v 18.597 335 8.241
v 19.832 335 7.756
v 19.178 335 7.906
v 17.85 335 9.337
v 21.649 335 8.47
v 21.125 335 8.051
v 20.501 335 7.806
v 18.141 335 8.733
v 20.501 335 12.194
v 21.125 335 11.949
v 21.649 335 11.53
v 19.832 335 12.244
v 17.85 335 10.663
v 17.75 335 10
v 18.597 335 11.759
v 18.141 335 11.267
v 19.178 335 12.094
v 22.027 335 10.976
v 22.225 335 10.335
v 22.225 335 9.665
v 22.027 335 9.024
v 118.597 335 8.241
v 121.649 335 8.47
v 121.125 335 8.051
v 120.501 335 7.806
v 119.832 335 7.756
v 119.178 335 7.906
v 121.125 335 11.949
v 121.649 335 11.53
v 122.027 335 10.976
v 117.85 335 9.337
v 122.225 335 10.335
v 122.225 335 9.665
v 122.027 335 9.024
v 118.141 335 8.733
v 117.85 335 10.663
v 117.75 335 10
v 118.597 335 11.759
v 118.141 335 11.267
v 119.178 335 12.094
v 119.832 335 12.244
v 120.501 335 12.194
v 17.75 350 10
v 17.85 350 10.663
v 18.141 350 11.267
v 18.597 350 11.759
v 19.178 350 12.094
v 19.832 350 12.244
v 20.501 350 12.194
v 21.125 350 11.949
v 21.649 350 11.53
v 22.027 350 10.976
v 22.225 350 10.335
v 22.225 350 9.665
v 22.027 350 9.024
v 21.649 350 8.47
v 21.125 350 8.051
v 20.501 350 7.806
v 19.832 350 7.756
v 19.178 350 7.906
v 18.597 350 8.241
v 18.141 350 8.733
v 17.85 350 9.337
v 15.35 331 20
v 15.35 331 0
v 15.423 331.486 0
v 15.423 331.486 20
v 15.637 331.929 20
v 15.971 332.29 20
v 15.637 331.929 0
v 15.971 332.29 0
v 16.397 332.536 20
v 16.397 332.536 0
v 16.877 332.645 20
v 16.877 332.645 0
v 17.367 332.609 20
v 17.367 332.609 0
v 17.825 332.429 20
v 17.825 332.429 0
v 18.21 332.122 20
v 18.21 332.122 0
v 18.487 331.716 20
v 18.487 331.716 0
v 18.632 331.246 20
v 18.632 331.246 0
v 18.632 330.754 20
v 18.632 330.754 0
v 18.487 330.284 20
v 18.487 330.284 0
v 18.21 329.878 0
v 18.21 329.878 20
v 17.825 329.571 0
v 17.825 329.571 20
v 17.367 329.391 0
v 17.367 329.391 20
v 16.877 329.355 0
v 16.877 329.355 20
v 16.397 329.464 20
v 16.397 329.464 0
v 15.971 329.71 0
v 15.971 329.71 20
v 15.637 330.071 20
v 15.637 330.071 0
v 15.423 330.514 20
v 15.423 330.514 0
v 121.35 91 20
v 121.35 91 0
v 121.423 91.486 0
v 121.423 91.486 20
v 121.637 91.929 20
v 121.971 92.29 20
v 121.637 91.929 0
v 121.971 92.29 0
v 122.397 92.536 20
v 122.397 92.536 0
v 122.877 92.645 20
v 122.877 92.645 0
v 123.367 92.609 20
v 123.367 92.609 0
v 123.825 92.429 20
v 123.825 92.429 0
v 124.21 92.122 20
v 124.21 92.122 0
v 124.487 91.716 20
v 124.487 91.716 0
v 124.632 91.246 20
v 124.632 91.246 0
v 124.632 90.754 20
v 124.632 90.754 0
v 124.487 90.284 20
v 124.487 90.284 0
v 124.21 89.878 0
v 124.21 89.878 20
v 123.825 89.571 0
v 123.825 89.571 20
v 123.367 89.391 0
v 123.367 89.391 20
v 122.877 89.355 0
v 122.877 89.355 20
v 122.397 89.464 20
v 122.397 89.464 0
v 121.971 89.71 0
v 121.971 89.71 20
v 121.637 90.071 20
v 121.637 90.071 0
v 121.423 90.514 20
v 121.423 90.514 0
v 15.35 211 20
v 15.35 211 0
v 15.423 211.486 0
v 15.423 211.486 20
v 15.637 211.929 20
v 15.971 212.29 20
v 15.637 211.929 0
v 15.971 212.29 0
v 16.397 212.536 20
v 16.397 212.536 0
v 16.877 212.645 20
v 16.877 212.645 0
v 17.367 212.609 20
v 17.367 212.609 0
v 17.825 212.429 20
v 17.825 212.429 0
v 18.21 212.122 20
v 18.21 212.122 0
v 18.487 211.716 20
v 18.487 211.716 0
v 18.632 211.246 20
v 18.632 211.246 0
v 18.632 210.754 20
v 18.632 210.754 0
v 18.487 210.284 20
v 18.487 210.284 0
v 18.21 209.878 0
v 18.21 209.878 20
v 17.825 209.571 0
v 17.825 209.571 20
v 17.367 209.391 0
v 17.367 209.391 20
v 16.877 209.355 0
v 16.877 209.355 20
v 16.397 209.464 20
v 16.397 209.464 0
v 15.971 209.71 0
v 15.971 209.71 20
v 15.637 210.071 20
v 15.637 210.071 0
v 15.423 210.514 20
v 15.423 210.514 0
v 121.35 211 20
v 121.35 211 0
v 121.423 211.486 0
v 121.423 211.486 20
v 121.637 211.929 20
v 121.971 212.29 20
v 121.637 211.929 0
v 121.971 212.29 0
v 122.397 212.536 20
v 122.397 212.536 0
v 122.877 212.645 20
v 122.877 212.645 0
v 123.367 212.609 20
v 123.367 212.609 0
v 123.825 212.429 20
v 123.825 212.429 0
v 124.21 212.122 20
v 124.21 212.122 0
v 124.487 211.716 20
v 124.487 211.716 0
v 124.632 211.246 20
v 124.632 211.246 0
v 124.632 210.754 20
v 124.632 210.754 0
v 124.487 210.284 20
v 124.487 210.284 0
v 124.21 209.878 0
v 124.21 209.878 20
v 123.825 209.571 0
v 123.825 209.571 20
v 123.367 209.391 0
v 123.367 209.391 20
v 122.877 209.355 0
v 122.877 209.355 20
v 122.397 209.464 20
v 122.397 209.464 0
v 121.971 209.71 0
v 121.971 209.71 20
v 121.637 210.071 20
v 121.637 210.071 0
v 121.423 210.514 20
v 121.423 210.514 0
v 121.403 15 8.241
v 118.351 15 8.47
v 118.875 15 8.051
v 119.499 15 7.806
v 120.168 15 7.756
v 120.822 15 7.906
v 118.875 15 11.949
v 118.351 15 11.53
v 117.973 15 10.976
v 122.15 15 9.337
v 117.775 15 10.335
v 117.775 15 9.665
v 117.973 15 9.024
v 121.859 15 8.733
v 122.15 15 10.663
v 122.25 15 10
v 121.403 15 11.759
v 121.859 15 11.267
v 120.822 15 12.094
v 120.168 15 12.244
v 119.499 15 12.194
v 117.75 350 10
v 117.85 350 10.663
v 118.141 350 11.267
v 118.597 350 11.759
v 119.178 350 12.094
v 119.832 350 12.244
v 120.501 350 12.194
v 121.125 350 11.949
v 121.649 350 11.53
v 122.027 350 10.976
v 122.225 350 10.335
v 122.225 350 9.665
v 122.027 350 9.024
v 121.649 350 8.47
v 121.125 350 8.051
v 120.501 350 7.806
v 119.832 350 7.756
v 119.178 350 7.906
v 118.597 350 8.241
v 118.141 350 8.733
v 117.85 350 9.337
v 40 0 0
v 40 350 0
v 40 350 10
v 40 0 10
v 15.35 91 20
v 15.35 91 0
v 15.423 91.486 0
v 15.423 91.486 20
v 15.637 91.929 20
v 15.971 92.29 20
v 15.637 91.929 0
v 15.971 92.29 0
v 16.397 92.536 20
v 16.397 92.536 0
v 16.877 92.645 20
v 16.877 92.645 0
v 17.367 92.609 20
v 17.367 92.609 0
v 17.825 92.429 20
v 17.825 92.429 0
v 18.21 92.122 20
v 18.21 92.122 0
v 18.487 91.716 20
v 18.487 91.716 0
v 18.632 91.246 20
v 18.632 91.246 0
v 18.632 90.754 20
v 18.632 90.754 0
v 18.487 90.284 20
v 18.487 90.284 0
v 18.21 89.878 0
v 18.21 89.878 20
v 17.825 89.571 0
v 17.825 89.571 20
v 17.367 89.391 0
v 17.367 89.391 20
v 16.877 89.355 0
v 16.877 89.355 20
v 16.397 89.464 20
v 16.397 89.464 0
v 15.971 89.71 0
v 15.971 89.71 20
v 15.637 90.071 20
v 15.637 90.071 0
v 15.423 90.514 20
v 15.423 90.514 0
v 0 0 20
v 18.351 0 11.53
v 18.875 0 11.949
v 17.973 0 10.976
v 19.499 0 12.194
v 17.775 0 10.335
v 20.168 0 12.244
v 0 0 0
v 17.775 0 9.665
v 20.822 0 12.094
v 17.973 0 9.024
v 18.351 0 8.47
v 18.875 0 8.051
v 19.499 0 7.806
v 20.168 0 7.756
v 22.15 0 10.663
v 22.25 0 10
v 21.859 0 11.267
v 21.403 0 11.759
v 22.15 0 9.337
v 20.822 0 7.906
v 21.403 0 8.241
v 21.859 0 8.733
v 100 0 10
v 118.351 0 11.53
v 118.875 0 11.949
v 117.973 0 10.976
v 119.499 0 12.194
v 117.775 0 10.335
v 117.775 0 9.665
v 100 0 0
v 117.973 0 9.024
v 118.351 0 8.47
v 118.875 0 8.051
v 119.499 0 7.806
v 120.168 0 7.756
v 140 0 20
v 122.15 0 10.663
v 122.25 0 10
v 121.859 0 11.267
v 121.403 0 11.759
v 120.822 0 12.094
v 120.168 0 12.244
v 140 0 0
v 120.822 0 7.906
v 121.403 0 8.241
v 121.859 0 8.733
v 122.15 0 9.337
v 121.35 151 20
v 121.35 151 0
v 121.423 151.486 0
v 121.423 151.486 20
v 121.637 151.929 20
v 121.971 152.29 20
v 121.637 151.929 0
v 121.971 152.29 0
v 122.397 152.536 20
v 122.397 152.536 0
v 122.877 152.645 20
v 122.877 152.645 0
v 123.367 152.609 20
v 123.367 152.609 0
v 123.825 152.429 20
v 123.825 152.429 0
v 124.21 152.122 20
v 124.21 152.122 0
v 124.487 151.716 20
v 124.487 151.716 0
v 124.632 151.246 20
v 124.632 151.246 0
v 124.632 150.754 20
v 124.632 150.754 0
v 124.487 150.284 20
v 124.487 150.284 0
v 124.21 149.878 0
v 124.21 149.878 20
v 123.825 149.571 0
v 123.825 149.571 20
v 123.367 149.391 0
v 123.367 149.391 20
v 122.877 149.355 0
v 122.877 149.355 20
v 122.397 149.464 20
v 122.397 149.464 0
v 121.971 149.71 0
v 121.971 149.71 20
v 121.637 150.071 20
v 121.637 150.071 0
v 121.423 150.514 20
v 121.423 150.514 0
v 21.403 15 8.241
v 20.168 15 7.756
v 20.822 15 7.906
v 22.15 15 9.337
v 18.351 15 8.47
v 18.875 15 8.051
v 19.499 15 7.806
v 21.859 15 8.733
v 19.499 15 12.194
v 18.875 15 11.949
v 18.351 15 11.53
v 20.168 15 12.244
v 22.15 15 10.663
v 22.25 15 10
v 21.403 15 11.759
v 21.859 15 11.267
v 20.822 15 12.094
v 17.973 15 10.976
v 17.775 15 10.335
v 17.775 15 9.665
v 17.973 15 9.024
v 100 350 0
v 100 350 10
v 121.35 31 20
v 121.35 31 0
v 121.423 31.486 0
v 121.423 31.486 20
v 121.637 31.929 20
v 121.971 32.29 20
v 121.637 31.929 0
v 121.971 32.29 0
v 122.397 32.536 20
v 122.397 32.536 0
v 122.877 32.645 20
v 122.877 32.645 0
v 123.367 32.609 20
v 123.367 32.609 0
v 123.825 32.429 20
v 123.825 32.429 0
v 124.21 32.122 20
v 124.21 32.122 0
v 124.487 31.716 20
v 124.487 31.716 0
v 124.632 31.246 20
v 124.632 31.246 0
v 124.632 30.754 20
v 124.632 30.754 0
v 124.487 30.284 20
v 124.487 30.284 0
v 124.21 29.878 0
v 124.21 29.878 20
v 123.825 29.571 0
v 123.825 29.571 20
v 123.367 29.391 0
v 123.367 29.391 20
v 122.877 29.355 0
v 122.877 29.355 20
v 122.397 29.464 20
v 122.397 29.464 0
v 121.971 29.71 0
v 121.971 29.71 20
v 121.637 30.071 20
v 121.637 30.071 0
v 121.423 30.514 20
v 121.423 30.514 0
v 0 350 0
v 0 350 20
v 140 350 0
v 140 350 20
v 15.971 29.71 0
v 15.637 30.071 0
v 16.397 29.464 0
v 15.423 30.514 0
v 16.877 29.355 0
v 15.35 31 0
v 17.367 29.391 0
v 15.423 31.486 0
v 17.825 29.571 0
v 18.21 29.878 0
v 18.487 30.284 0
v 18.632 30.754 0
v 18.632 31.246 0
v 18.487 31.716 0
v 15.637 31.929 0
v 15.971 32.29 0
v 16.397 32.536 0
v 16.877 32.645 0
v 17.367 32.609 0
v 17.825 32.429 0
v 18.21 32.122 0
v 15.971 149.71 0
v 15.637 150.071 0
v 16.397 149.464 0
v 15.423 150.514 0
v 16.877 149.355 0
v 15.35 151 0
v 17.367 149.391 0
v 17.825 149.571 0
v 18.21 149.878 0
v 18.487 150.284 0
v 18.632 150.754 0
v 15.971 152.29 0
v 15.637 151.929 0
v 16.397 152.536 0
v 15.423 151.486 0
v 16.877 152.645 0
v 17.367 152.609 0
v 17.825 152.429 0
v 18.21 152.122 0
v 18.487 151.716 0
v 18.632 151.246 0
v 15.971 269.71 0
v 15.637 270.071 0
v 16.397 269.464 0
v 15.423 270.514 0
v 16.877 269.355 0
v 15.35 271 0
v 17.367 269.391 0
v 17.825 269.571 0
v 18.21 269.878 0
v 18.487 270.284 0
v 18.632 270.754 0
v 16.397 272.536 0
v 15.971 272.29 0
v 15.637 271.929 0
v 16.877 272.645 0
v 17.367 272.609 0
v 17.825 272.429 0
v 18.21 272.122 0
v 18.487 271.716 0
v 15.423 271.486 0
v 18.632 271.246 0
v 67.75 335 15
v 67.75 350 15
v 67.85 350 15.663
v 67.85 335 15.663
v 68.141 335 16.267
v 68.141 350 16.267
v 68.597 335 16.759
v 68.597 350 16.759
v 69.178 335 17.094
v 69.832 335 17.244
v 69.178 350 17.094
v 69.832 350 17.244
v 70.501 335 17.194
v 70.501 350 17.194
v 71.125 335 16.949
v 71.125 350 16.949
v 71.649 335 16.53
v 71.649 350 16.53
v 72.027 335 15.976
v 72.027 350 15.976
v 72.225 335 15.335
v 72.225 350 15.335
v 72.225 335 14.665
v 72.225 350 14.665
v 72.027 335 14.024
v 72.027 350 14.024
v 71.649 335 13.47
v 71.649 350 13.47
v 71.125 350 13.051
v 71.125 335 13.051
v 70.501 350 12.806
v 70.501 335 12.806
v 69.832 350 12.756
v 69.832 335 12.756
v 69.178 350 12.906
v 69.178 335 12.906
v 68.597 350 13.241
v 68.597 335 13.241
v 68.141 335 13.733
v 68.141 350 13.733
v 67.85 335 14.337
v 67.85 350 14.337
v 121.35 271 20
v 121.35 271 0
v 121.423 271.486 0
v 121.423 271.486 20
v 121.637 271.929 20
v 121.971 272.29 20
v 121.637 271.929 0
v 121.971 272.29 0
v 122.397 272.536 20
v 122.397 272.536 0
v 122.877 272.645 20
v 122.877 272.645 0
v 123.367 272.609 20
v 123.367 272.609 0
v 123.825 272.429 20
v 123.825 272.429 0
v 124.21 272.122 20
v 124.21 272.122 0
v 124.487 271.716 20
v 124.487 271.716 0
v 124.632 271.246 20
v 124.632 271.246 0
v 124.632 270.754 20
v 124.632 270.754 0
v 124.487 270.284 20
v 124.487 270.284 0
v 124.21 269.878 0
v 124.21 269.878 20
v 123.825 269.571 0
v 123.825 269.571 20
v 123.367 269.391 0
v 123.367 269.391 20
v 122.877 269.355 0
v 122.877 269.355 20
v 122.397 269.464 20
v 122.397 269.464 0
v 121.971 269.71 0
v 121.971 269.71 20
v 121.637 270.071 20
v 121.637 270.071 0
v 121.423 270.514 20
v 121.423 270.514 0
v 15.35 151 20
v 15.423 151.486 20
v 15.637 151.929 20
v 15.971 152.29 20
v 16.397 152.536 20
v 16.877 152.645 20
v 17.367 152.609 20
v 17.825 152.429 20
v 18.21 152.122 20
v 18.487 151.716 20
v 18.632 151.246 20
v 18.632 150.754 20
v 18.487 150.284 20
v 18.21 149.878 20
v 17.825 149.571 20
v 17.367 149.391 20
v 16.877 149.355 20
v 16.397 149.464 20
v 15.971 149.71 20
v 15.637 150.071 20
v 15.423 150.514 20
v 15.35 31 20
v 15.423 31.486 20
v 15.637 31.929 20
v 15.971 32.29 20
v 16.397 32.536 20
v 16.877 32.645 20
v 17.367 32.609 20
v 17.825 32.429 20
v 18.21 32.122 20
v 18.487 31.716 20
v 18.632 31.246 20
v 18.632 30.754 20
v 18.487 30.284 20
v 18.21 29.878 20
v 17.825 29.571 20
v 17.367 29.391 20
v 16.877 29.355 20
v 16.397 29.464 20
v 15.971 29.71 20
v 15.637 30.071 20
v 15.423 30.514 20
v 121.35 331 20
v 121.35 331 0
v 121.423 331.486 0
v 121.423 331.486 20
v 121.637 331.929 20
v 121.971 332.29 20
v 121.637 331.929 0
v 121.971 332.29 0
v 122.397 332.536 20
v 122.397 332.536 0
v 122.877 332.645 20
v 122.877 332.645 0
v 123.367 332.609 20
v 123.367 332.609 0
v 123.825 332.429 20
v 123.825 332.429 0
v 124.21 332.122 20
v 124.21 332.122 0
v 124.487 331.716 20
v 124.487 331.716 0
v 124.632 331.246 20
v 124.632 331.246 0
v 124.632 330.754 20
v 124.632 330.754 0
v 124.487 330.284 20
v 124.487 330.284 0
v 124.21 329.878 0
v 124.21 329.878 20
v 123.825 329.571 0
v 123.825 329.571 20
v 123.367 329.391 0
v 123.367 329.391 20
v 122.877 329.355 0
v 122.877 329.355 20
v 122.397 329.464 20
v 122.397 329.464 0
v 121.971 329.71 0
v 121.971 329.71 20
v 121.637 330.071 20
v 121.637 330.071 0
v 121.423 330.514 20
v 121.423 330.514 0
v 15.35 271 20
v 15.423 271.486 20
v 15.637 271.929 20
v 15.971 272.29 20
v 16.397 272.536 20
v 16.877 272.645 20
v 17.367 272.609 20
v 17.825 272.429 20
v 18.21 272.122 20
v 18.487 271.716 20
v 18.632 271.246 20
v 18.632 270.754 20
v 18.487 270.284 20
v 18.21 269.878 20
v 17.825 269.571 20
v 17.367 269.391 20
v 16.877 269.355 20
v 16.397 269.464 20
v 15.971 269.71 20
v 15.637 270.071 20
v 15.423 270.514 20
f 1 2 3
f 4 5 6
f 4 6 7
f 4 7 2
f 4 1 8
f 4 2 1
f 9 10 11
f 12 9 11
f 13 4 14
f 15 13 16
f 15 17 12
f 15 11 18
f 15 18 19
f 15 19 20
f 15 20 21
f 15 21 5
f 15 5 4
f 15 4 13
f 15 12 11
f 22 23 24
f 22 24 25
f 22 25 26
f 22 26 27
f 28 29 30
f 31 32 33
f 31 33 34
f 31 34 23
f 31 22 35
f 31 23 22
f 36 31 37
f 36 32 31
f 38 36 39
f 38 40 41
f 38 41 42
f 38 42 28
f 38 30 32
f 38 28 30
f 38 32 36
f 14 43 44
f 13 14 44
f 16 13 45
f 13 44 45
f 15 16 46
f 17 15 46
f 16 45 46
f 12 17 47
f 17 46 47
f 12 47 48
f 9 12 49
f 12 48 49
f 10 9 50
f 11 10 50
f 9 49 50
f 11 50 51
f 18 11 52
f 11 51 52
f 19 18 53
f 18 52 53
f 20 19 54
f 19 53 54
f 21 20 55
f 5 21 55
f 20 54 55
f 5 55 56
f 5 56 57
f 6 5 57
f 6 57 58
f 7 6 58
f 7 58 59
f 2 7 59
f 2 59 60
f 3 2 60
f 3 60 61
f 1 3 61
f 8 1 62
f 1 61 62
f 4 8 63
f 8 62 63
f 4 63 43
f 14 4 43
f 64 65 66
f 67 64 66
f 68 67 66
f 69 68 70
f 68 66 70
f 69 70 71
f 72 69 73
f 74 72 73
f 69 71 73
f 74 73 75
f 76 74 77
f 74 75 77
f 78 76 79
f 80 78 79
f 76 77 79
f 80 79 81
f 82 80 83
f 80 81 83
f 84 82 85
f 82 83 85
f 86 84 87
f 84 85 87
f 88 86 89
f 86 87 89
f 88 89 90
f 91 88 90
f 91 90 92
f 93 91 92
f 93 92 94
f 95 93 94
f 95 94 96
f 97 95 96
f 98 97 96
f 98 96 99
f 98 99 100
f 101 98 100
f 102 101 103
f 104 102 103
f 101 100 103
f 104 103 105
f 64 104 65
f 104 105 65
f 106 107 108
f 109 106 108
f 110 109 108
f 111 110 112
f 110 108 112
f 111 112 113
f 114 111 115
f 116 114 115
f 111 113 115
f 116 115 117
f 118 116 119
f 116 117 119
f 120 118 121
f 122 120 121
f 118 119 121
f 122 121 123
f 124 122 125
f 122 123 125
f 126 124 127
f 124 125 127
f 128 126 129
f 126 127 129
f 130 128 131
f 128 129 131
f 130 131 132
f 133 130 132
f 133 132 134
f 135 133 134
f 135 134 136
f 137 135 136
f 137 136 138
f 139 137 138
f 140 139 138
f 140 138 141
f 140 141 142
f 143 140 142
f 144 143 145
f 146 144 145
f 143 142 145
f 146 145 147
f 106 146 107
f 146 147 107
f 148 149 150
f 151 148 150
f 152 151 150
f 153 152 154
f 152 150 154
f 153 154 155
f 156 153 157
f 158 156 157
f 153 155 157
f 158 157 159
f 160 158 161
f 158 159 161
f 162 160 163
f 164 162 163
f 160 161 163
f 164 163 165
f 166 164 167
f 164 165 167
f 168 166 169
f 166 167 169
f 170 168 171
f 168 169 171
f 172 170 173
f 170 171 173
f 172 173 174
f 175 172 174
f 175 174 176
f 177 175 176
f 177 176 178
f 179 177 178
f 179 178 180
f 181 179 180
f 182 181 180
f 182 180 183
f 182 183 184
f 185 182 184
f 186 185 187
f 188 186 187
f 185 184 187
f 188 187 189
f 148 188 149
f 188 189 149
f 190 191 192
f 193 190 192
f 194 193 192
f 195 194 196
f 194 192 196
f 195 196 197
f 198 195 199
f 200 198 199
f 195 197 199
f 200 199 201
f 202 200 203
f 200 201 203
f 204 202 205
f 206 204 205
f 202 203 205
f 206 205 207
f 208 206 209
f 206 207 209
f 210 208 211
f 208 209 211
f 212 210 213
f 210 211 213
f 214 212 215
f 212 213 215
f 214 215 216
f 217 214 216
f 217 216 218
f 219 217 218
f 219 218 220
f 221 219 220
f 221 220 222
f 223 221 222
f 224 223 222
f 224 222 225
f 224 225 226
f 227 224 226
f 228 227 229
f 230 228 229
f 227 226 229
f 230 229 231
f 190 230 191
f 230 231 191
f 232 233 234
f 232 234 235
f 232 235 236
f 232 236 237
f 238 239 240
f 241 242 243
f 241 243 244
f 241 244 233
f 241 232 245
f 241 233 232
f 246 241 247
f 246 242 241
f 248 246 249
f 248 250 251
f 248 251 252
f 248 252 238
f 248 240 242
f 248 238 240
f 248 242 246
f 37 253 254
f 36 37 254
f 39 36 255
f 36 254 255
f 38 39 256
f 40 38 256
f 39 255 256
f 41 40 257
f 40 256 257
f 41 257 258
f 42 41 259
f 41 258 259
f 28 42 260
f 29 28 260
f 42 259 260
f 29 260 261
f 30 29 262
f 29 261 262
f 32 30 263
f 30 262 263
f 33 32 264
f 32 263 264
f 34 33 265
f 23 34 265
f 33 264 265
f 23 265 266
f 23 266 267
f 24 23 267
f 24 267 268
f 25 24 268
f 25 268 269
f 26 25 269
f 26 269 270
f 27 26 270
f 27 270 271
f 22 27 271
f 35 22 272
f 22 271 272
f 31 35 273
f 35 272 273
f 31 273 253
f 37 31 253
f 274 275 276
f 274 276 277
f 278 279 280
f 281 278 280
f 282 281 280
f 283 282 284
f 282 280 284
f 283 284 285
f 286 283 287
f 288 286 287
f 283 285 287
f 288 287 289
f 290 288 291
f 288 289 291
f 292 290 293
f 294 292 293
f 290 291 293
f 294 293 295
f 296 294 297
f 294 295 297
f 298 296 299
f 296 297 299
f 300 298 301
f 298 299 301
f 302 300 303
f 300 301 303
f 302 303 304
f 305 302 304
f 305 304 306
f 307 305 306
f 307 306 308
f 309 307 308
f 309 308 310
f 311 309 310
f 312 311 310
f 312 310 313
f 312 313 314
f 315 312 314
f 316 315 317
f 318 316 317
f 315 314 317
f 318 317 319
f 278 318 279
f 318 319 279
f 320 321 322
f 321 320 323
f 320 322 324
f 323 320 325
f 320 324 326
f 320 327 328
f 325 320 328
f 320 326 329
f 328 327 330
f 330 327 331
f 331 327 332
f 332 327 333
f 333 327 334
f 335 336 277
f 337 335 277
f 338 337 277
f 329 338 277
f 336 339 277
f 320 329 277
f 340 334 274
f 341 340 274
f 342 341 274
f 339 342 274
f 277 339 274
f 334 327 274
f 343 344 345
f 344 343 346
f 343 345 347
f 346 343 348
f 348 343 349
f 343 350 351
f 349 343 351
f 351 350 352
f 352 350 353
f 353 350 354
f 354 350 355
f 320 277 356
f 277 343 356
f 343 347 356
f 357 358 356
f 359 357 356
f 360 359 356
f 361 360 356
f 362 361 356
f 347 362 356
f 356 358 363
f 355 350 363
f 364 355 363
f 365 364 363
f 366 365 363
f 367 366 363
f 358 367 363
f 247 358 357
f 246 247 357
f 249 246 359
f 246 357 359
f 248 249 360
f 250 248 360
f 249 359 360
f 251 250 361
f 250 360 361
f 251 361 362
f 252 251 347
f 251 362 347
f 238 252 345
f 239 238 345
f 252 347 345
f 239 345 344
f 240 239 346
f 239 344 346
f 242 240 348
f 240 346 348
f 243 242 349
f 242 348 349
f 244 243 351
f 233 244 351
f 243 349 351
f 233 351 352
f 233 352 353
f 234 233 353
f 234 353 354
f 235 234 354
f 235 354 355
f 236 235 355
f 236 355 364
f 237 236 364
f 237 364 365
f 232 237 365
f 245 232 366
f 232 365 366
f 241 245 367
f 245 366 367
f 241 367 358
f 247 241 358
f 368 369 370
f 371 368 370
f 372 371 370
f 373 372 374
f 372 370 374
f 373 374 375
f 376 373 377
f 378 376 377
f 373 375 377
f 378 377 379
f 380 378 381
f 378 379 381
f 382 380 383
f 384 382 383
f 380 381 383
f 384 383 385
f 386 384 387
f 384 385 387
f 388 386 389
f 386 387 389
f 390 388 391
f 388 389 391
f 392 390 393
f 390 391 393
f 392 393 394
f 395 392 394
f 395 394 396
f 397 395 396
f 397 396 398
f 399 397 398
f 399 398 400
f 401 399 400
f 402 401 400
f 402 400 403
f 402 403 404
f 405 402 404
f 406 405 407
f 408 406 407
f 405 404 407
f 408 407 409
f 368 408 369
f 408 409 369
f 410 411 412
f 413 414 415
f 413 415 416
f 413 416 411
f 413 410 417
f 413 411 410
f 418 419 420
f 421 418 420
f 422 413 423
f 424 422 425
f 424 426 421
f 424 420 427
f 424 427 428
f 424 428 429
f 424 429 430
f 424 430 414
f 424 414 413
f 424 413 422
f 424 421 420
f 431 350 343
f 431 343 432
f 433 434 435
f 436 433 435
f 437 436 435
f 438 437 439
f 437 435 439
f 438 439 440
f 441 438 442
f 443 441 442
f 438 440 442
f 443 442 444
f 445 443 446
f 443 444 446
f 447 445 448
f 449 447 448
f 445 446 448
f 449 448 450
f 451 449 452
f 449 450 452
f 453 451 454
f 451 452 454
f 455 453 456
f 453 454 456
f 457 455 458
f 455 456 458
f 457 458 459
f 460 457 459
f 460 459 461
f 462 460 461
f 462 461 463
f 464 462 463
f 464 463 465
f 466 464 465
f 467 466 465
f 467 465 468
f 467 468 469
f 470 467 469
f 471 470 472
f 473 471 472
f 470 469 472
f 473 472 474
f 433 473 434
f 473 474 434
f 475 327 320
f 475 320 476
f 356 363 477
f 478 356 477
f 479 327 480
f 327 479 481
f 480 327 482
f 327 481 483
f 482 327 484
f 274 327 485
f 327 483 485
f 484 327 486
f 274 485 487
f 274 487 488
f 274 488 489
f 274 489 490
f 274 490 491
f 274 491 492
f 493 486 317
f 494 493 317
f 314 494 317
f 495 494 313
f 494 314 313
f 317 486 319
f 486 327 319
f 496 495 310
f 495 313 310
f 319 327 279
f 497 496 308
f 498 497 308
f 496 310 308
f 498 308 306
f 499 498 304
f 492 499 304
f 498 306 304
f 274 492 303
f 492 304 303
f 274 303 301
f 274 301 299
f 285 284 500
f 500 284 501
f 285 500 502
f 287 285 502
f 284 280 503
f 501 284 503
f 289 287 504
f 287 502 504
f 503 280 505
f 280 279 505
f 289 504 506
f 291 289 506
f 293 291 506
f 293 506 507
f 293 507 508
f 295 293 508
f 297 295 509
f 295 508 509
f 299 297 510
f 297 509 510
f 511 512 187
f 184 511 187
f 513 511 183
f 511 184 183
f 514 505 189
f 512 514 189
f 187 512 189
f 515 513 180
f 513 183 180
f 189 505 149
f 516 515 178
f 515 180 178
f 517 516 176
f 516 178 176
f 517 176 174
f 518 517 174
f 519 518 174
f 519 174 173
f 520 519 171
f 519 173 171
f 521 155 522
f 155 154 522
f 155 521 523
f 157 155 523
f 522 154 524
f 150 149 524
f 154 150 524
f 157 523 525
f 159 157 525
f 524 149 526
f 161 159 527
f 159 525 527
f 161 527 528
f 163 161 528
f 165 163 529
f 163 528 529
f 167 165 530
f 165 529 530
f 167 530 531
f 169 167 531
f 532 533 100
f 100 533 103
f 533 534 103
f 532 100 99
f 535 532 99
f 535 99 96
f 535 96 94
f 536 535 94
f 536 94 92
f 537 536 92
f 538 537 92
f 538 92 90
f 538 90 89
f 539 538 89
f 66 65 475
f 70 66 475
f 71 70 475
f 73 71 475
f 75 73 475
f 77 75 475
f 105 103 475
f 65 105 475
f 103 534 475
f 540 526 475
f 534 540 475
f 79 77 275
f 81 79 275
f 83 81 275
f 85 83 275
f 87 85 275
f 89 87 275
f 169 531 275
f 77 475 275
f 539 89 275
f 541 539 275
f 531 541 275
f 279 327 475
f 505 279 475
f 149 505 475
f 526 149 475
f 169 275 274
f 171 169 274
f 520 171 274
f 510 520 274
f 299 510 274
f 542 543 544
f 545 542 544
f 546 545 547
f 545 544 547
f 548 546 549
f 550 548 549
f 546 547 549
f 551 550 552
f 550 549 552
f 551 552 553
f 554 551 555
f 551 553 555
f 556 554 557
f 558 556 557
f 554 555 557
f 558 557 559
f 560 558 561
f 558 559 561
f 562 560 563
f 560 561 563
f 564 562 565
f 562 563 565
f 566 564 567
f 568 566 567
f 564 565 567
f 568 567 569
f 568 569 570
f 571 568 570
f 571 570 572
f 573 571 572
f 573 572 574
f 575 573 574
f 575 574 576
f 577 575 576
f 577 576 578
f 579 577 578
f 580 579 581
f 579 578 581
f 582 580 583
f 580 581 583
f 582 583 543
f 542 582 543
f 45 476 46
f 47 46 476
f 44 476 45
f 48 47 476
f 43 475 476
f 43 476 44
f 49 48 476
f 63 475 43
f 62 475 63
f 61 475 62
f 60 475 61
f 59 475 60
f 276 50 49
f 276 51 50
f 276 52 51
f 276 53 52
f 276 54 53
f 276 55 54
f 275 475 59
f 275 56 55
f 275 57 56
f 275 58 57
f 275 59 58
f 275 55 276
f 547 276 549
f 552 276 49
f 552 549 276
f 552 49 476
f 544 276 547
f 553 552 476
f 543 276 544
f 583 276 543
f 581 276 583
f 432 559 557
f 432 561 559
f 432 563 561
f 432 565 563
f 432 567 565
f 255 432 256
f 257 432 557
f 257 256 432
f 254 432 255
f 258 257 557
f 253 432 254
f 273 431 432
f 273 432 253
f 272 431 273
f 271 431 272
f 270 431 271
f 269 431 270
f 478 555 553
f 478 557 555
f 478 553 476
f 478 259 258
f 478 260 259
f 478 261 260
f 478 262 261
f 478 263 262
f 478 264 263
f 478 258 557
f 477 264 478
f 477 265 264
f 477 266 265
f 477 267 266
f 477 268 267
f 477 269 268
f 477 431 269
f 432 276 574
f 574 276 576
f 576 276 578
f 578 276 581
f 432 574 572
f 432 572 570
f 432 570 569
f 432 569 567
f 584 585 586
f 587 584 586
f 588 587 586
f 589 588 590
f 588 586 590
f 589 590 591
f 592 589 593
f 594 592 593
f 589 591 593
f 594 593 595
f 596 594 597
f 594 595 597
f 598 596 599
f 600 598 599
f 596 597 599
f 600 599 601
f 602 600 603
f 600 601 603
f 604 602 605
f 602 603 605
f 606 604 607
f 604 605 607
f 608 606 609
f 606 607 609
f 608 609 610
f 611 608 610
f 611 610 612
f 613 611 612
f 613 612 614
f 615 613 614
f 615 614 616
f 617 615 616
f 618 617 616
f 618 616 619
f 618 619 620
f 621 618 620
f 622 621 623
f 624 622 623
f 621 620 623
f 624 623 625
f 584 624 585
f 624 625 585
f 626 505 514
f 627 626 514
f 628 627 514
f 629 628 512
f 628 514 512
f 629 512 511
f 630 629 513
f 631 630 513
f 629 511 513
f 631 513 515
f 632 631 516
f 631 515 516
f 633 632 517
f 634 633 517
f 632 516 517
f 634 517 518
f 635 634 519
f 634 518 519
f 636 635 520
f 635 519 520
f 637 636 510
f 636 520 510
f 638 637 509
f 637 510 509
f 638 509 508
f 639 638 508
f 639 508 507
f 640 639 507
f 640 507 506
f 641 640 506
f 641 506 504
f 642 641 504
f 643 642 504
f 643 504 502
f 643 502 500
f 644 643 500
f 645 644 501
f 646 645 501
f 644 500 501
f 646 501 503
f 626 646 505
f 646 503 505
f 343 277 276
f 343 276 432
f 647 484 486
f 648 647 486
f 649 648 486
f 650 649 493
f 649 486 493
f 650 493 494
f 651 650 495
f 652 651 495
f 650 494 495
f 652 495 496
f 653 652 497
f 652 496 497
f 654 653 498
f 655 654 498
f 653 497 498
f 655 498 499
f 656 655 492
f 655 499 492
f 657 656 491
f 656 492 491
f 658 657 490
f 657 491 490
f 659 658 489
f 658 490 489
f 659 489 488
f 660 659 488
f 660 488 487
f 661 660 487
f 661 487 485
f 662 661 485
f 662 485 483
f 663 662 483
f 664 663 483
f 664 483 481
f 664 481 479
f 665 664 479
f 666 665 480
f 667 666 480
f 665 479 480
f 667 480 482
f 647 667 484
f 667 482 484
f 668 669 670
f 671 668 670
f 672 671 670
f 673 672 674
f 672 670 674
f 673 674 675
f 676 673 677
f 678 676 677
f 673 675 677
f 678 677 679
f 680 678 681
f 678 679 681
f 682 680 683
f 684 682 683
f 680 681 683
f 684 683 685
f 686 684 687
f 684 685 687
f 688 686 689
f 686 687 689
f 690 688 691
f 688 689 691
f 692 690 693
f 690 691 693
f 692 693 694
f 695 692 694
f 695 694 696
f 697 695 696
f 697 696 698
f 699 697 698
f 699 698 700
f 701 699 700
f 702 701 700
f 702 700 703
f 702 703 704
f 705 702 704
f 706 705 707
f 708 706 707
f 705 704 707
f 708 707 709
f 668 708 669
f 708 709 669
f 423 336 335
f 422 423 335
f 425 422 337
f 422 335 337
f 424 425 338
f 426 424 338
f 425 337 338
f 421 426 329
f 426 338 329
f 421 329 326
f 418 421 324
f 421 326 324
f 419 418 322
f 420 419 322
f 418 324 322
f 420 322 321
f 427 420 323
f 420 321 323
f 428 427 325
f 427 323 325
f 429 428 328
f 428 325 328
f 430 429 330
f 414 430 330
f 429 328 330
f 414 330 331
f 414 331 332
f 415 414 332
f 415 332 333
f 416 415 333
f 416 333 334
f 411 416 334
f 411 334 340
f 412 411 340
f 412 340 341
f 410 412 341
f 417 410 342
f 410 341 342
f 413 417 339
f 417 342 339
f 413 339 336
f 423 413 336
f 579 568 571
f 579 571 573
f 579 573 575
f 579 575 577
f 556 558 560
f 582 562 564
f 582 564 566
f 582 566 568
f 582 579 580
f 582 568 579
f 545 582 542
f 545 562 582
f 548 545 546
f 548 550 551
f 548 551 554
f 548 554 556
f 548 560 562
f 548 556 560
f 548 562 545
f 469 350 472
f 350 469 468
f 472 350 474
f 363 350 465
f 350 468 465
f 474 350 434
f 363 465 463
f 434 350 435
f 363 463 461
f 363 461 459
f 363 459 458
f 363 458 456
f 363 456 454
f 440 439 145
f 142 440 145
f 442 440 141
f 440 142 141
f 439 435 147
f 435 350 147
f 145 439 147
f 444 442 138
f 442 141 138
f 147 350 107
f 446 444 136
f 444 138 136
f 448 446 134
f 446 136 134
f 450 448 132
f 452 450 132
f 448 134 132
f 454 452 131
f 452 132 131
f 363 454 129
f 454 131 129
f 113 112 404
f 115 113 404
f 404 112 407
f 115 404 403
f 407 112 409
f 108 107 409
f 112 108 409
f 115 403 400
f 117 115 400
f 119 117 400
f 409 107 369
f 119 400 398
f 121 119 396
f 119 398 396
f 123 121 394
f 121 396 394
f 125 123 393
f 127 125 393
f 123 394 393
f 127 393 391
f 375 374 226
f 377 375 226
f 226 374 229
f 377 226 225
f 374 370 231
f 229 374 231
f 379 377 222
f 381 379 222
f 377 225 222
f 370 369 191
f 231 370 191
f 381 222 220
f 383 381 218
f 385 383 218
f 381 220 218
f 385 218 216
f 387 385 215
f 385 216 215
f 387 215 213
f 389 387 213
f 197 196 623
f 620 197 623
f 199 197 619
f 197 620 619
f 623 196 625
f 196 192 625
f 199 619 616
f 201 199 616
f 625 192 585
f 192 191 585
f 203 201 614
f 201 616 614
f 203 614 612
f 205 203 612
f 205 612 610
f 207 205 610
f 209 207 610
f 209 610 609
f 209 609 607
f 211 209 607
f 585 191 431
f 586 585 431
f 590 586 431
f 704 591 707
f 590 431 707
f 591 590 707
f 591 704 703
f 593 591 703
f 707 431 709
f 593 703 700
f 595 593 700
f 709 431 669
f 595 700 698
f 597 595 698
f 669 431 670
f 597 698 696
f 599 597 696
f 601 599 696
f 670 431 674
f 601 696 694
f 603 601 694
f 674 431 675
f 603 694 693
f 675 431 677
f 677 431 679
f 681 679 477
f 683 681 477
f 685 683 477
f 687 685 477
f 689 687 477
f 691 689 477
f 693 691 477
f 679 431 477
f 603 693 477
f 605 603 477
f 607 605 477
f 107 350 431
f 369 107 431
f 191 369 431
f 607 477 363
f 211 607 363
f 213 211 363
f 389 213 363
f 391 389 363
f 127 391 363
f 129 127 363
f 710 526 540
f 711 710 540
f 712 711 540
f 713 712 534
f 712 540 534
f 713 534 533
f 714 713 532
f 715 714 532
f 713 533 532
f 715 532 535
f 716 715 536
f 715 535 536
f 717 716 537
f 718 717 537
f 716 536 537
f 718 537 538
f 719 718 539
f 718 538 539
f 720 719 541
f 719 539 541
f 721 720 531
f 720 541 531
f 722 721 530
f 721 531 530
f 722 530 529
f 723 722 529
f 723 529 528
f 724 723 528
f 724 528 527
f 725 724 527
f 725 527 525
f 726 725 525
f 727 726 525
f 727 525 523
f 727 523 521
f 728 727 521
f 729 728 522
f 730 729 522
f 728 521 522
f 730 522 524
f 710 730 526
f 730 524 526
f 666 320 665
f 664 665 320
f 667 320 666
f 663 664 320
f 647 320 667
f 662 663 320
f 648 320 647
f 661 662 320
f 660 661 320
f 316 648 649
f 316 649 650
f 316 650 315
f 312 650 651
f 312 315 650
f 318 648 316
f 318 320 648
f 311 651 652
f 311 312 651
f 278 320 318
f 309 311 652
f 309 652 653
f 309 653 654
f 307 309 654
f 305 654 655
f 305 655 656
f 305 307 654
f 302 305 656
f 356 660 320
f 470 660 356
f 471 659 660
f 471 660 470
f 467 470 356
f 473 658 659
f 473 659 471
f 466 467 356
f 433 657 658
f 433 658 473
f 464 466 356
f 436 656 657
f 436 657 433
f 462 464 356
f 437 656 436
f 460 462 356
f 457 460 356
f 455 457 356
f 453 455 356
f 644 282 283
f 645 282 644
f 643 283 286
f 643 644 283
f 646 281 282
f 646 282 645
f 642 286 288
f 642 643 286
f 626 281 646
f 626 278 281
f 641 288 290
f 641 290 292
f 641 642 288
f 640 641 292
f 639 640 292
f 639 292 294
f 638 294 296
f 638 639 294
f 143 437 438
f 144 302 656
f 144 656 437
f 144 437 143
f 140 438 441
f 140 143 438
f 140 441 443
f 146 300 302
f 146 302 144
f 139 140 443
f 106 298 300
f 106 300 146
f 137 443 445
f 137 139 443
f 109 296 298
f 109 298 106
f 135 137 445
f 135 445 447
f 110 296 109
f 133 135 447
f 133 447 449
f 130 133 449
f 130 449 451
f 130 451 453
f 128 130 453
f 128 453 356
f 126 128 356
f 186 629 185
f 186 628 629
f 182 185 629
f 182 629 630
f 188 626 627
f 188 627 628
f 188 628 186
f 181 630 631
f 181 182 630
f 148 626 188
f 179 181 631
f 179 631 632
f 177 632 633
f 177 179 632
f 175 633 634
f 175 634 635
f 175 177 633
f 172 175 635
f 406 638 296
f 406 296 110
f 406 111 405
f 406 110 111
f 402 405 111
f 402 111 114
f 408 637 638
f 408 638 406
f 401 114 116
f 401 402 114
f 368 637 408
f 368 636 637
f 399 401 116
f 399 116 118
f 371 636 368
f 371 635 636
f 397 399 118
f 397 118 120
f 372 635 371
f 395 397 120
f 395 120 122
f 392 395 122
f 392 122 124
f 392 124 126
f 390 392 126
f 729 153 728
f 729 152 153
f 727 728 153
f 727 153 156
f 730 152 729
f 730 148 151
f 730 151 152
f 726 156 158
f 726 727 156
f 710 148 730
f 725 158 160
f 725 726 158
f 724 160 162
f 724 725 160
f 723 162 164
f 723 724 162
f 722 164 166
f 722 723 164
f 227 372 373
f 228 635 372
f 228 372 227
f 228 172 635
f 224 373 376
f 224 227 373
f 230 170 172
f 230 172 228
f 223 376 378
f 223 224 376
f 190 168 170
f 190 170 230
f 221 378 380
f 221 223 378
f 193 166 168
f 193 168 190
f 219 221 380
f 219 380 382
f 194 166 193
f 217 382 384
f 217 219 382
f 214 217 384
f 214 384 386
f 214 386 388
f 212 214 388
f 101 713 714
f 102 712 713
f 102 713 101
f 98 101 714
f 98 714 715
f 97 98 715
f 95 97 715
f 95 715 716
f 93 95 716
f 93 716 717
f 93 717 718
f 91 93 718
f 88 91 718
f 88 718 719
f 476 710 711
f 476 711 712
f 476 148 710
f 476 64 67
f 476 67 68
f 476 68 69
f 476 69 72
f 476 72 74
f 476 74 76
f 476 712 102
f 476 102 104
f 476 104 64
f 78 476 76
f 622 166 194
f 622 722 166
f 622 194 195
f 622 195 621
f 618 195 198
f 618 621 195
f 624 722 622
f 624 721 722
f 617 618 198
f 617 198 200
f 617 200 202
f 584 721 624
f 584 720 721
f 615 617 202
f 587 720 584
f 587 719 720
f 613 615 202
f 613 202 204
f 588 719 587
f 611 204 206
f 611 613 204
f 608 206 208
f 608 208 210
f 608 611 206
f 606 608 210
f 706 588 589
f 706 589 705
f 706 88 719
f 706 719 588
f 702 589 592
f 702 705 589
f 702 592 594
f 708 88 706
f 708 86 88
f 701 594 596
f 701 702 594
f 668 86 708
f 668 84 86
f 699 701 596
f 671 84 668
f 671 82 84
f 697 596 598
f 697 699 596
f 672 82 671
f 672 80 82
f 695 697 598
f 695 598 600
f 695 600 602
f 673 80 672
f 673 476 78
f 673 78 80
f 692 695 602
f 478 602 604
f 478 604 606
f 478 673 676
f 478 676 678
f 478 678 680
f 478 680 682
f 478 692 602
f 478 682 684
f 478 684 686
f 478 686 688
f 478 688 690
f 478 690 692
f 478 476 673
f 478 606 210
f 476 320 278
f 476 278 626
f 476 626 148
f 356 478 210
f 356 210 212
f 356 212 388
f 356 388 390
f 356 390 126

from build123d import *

# Parameters (mm, degrees)
SKETCH1_W          = 140
SKETCH1_H          = 350
EXTRUDE1_DEPTH     = 20
CUT_EXTRUDE2_DEPTH = 10
SKETCH4_R          = 2.25
CUT_EXTRUDE3_DEPTH = 15
SKETCH6_R          = 2.25
CUT_EXTRUDE5_DEPTH = 15
SKETCH7_R          = 1.65
CUT_EXTRUDE6_DEPTH = 20


with BuildPart() as part:
    # Sketch1 → Extrude1 (new body)
    with BuildSketch(Plane.XY):
        with Locations((70, 175)):
            Rectangle(SKETCH1_W, SKETCH1_H)
    extrude(amount=EXTRUDE1_DEPTH)

    # Sketch3 → Cut-Extrude2 (cut)
    with BuildSketch(Plane(origin=(0, 0, 0), x_dir=(-1, 0, 0), z_dir=(0, 0, -1))):
        Polygon((-70, 350), (-55, 350), (-40, 350), (-40, 0), (-100, 0), (-100, 350), align=None)
    extrude(amount=-CUT_EXTRUDE2_DEPTH, mode=Mode.SUBTRACT)

    # Sketch4 → Cut-Extrude3 (cut)
    with BuildSketch(Plane(origin=(0, 350, 0), x_dir=(-1, 0, 0), z_dir=(0, 1, 0))):
        with Locations((-20, 10)):
            Circle(SKETCH4_R)
        with Locations((-70, 15)):
            Circle(SKETCH4_R)
        with Locations((-120, 10)):
            Circle(SKETCH4_R)
    extrude(amount=-CUT_EXTRUDE3_DEPTH, mode=Mode.SUBTRACT)

    # Sketch6 → Cut-Extrude5 (cut)
    with BuildSketch(Plane.XZ):
        with Locations((20, 10)):
            Circle(SKETCH6_R)
        with Locations((120, 10)):
            Circle(SKETCH6_R)
    extrude(amount=-CUT_EXTRUDE5_DEPTH, mode=Mode.SUBTRACT)

    # Sketch7 → Cut-Extrude6 (cut)
    with BuildSketch(Plane(origin=(0, 0, 0), x_dir=(-1, 0, 0), z_dir=(0, 0, -1))):
        with Locations((-123, 331)):
            Circle(SKETCH7_R)
        with Locations((-17, 331)):
            Circle(SKETCH7_R)
        with Locations((-17, 31)):
            Circle(SKETCH7_R)
        with Locations((-123, 31)):
            Circle(SKETCH7_R)
        with Locations((-17, 271)):
            Circle(SKETCH7_R)
        with Locations((-17, 211)):
            Circle(SKETCH7_R)
        with Locations((-17, 151)):
            Circle(SKETCH7_R)
        with Locations((-17, 91)):
            Circle(SKETCH7_R)
        with Locations((-123, 91)):
            Circle(SKETCH7_R)
        with Locations((-123, 151)):
            Circle(SKETCH7_R)
        with Locations((-123, 211)):
            Circle(SKETCH7_R)
        with Locations((-123, 271)):
            Circle(SKETCH7_R)
    extrude(amount=-CUT_EXTRUDE6_DEPTH, mode=Mode.SUBTRACT)


solid = part.part
